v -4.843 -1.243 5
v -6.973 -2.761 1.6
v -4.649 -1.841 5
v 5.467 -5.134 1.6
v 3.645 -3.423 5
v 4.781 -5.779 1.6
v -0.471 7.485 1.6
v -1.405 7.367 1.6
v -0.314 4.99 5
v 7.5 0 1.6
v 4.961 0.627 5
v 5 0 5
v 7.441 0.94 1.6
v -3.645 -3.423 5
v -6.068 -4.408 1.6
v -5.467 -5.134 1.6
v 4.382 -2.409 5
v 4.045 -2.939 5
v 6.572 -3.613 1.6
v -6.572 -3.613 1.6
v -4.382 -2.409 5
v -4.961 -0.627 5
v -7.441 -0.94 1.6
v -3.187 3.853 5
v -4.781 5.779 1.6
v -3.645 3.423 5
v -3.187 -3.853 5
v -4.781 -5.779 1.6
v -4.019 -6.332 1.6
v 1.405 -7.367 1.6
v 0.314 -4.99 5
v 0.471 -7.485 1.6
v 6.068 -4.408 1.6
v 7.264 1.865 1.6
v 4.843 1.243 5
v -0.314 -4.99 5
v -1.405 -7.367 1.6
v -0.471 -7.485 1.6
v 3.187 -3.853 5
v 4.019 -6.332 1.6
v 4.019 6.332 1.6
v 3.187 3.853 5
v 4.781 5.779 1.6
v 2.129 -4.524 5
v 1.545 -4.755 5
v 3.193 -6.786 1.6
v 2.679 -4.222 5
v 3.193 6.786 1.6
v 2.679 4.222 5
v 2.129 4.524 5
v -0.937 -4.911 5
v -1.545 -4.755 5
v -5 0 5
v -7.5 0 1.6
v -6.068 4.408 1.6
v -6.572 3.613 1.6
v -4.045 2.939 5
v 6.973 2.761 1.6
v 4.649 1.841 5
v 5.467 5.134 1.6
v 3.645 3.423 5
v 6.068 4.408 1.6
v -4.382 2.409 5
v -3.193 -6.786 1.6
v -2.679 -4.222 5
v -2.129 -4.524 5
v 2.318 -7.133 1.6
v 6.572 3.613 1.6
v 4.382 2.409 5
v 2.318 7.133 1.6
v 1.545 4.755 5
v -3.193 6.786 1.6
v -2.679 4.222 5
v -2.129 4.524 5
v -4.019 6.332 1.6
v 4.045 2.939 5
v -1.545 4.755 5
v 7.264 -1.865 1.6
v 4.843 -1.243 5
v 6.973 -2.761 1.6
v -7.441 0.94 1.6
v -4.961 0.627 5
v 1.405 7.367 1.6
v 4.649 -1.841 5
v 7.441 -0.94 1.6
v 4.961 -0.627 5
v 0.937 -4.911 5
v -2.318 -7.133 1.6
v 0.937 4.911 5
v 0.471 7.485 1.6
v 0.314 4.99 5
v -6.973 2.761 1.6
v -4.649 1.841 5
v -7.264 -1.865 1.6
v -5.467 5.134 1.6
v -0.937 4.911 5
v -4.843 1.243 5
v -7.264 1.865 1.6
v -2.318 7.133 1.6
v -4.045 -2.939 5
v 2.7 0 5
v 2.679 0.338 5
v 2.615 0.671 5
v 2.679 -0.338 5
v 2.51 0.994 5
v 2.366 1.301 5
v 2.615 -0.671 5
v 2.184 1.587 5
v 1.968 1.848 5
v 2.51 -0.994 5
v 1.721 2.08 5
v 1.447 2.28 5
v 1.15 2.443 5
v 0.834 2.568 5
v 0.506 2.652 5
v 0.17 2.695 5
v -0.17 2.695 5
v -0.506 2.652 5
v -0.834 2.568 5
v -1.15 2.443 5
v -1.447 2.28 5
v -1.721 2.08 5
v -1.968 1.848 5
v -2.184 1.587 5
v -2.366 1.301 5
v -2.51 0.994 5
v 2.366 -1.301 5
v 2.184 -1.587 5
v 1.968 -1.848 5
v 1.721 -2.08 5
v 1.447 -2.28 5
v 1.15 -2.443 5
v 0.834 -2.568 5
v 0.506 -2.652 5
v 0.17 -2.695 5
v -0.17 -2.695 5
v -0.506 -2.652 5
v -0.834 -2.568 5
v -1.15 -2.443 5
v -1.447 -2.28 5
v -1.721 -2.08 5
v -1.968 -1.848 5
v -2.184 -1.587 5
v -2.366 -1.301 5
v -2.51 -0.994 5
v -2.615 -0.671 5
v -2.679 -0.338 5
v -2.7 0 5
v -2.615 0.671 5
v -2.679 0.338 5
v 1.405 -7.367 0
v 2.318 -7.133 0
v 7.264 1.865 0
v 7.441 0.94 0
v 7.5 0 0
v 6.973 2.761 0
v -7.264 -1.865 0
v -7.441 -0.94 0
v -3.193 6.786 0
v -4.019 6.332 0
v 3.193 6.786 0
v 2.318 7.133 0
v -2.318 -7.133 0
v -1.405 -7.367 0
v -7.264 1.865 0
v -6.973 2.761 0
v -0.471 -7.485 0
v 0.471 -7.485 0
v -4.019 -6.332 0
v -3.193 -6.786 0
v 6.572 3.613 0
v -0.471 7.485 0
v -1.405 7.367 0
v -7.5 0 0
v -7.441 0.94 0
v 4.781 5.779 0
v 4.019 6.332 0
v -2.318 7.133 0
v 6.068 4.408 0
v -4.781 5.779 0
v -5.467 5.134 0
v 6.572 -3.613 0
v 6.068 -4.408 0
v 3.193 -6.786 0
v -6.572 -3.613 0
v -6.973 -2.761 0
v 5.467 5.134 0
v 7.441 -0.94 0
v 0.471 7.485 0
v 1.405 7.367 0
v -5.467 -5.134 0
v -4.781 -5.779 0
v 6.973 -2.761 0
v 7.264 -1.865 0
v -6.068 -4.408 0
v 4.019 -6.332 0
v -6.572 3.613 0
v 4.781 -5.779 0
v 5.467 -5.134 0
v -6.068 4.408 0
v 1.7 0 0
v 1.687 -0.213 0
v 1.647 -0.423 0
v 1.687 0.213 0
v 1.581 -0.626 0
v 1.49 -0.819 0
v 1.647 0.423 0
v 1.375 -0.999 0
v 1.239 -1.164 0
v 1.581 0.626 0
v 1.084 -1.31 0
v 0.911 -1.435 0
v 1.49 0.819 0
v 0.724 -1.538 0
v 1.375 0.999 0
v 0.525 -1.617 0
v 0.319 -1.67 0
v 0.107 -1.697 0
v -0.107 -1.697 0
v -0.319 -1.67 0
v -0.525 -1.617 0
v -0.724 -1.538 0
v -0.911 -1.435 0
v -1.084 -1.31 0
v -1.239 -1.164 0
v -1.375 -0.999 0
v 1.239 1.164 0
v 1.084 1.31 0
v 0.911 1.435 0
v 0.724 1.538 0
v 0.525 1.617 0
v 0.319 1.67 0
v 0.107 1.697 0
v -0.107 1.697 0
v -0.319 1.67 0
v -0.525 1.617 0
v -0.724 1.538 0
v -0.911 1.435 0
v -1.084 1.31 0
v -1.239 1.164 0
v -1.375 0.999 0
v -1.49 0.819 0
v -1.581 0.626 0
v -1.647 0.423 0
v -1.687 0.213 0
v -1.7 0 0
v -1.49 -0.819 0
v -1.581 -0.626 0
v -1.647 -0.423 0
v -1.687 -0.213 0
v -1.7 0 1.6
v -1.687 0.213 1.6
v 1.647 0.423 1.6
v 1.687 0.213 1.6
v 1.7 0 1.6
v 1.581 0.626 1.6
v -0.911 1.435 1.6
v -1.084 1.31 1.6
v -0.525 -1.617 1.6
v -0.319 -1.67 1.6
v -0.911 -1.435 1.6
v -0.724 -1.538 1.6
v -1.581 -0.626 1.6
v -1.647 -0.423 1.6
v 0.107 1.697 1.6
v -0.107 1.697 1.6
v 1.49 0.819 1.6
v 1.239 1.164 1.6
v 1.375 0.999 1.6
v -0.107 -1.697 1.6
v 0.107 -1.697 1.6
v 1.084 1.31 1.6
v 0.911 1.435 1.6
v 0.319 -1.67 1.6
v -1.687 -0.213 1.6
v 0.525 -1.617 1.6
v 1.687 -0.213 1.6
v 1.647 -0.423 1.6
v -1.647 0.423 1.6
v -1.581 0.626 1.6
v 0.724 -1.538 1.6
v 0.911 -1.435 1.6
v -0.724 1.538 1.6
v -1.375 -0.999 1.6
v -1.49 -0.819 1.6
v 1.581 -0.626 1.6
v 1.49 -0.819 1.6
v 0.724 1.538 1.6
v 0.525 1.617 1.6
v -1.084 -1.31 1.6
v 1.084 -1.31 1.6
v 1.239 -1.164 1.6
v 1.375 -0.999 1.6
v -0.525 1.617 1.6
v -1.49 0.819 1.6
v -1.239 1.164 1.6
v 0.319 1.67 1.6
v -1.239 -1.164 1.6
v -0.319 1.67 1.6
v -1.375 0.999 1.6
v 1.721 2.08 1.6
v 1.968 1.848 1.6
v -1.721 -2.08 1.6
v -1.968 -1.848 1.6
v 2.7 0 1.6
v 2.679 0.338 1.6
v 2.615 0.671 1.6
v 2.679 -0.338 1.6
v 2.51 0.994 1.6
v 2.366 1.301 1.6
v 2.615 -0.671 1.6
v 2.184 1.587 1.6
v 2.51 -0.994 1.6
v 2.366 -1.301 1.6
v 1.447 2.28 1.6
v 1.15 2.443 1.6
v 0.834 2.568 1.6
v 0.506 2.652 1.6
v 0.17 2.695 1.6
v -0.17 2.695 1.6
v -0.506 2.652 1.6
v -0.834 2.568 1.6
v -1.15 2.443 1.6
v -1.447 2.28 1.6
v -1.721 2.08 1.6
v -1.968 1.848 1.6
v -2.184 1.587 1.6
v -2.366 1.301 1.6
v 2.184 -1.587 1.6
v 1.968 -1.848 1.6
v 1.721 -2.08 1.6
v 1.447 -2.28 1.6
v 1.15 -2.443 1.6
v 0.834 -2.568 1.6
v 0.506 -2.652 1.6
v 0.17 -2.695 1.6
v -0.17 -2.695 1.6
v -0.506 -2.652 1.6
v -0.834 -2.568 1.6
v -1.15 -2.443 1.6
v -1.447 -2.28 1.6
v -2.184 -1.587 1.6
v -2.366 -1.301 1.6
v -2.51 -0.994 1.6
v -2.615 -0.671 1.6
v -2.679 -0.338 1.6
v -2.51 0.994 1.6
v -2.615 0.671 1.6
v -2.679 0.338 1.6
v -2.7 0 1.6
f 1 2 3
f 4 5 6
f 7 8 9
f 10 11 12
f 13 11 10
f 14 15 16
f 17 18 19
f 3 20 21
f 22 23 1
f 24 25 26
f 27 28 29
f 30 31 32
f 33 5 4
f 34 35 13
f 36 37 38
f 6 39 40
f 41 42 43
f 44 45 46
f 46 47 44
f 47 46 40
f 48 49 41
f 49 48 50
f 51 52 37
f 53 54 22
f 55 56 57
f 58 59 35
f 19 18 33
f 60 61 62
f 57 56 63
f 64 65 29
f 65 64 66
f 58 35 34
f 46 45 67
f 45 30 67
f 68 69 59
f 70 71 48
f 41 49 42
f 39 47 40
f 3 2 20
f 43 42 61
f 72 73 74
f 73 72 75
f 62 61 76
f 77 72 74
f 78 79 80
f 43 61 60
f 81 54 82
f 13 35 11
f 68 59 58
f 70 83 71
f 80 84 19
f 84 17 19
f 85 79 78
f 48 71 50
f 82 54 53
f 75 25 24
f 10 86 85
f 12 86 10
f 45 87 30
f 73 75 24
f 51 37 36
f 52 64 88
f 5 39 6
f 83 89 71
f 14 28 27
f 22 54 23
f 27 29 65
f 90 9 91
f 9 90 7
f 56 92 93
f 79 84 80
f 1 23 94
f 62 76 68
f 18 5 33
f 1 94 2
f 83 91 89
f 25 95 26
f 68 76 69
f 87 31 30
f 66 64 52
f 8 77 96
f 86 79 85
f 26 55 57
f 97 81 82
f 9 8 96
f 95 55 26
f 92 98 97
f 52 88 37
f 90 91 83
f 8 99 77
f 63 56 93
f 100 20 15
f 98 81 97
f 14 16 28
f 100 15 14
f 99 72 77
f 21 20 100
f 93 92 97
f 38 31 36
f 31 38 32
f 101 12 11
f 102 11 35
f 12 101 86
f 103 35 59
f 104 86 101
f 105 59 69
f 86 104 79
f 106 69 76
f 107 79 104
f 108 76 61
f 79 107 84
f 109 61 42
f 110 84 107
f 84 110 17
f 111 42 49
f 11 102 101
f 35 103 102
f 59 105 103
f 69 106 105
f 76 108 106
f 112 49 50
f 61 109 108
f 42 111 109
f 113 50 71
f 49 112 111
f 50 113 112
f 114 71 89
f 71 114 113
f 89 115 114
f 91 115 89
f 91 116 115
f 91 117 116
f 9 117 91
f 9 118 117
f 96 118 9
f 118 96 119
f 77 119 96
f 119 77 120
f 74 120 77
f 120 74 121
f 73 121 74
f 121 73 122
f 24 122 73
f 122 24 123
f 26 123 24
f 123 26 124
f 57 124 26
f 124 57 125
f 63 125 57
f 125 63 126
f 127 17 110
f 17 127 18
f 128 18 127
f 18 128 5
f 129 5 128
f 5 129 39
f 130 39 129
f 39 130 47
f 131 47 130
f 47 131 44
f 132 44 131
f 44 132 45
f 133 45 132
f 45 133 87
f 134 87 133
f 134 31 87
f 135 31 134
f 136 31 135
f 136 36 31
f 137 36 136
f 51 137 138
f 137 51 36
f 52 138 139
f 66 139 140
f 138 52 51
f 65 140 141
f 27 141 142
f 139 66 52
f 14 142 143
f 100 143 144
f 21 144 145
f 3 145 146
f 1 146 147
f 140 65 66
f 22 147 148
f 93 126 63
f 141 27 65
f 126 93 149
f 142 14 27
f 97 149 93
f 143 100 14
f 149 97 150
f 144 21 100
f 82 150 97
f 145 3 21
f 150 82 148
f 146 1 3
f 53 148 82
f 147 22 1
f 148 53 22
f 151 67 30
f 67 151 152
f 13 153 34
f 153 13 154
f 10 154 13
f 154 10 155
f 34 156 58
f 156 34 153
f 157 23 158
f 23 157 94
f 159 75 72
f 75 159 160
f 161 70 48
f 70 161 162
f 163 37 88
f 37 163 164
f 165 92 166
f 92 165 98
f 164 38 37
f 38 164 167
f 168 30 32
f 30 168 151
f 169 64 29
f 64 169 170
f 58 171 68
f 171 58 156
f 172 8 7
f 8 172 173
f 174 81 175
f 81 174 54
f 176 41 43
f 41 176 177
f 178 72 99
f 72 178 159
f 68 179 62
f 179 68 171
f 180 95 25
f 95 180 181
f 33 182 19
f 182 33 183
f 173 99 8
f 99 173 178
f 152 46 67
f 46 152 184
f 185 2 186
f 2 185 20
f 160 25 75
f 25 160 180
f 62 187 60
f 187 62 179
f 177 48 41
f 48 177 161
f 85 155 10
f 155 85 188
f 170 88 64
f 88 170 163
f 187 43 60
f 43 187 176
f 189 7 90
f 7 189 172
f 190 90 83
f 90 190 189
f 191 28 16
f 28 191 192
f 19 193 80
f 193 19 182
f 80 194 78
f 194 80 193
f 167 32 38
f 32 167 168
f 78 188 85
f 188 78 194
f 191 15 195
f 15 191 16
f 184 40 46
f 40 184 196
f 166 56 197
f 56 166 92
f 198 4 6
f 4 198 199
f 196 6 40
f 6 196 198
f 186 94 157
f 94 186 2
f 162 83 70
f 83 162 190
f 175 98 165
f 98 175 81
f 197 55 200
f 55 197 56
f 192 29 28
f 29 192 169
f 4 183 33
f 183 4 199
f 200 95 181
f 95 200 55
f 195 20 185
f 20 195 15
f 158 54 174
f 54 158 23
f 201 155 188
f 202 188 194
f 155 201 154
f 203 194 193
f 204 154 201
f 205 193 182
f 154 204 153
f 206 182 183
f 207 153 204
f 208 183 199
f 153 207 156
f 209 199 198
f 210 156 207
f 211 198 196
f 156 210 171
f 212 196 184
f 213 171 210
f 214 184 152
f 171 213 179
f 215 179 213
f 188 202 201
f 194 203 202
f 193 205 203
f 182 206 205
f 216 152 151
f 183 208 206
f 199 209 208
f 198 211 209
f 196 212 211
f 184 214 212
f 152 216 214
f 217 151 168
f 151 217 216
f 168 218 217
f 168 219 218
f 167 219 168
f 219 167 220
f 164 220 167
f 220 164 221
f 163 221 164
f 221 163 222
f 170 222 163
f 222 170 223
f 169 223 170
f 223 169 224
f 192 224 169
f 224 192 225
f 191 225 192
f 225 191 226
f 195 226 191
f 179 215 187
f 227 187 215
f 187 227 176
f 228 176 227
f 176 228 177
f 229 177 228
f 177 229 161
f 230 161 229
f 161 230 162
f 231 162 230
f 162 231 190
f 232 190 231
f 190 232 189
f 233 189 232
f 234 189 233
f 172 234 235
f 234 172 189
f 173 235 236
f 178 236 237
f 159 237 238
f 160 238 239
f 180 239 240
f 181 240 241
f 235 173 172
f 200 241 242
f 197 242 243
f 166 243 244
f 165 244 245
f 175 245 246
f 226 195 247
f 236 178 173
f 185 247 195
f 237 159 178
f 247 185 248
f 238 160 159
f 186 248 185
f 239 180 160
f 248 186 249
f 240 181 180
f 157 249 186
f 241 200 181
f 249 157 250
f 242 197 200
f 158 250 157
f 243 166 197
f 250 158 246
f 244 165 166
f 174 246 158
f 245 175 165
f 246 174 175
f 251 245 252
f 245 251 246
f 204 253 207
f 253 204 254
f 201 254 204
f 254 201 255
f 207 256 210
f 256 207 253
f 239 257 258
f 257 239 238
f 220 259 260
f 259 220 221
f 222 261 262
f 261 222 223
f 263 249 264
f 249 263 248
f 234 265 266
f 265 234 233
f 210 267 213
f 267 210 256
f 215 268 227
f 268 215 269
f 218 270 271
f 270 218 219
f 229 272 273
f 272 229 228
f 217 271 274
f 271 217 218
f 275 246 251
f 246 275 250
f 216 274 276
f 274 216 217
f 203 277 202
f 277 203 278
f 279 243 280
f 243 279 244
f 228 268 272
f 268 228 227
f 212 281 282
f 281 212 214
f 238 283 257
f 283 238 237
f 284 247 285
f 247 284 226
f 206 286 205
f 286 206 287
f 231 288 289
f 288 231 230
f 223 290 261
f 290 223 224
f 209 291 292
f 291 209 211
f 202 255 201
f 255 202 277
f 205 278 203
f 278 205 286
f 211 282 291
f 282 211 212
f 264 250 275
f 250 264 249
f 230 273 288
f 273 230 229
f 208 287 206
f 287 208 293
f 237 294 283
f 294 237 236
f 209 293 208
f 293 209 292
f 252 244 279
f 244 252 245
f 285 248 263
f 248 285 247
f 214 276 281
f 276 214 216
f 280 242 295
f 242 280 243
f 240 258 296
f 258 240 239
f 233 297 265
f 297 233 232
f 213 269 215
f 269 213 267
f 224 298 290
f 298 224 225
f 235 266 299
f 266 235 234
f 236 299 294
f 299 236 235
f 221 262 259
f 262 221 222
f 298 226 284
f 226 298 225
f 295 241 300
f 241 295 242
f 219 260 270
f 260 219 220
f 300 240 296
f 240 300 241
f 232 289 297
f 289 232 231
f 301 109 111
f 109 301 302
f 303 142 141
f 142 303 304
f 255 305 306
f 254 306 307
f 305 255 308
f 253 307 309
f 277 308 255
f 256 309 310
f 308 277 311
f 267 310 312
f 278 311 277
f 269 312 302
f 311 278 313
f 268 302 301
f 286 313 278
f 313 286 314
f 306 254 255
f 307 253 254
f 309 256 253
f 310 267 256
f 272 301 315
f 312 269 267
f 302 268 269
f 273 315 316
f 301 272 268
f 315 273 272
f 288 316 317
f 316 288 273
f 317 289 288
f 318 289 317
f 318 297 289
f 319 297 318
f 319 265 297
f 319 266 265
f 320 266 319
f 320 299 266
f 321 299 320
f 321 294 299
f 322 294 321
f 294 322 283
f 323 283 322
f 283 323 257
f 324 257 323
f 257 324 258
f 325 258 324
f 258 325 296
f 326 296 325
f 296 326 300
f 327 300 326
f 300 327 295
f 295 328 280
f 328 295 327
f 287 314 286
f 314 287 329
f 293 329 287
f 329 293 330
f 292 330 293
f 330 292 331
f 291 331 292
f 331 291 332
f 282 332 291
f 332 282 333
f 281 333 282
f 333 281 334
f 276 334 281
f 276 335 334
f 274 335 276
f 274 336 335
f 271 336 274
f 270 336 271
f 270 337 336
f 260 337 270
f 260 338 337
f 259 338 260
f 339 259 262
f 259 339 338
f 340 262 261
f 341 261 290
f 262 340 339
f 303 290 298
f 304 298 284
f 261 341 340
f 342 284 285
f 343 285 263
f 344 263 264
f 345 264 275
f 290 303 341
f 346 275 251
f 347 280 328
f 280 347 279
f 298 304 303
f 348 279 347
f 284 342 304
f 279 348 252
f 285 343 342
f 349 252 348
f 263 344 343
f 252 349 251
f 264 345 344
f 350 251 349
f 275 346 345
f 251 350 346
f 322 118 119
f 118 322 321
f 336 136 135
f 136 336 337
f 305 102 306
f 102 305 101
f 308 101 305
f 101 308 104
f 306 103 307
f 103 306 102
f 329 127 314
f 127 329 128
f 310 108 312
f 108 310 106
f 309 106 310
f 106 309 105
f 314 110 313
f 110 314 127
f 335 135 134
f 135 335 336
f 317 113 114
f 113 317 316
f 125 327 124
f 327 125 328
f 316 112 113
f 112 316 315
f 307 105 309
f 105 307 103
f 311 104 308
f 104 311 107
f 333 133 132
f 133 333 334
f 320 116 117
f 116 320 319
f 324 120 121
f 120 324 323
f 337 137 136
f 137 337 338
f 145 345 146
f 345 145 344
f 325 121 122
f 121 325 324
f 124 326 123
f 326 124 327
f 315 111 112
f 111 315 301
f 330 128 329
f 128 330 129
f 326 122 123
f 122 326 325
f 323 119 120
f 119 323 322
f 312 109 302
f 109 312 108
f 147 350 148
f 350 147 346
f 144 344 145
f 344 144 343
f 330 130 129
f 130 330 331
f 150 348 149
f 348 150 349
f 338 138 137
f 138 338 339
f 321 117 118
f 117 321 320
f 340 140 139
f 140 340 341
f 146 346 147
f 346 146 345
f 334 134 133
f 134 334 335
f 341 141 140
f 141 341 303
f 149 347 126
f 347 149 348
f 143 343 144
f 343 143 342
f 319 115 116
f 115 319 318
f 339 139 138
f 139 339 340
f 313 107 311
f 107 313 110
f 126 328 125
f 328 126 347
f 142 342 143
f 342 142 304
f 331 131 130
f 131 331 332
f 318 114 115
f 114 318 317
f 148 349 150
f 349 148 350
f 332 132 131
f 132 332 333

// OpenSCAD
// Small fix for a binocular thing that brooke

thickness = 1.6;
hole_radius = 1.7;
head_radius = 2.5 + 0.2;
outer_radius = 7.5;
outer_top_radius = 5;
outer_thickness = 5;

pad = 0.05;

$fn = 50;

module main () {
    difference() {
        // Main cone

        union() {
            translate([0,0,thickness]) {
                cylinder( r2 = outer_top_radius, r1 = outer_radius, h = outer_thickness-thickness );
            }
            cylinder( r = outer_radius, h = thickness );
        }

        // Cut for screw
        translate([0,0,-pad]) {
            cylinder( h = outer_thickness * 2, r = hole_radius );
        }

        // Cut for screw head
        translate([0,0,thickness]) {
            cylinder( h = outer_thickness * 2, r = head_radius );
        }
    }
}


main();
